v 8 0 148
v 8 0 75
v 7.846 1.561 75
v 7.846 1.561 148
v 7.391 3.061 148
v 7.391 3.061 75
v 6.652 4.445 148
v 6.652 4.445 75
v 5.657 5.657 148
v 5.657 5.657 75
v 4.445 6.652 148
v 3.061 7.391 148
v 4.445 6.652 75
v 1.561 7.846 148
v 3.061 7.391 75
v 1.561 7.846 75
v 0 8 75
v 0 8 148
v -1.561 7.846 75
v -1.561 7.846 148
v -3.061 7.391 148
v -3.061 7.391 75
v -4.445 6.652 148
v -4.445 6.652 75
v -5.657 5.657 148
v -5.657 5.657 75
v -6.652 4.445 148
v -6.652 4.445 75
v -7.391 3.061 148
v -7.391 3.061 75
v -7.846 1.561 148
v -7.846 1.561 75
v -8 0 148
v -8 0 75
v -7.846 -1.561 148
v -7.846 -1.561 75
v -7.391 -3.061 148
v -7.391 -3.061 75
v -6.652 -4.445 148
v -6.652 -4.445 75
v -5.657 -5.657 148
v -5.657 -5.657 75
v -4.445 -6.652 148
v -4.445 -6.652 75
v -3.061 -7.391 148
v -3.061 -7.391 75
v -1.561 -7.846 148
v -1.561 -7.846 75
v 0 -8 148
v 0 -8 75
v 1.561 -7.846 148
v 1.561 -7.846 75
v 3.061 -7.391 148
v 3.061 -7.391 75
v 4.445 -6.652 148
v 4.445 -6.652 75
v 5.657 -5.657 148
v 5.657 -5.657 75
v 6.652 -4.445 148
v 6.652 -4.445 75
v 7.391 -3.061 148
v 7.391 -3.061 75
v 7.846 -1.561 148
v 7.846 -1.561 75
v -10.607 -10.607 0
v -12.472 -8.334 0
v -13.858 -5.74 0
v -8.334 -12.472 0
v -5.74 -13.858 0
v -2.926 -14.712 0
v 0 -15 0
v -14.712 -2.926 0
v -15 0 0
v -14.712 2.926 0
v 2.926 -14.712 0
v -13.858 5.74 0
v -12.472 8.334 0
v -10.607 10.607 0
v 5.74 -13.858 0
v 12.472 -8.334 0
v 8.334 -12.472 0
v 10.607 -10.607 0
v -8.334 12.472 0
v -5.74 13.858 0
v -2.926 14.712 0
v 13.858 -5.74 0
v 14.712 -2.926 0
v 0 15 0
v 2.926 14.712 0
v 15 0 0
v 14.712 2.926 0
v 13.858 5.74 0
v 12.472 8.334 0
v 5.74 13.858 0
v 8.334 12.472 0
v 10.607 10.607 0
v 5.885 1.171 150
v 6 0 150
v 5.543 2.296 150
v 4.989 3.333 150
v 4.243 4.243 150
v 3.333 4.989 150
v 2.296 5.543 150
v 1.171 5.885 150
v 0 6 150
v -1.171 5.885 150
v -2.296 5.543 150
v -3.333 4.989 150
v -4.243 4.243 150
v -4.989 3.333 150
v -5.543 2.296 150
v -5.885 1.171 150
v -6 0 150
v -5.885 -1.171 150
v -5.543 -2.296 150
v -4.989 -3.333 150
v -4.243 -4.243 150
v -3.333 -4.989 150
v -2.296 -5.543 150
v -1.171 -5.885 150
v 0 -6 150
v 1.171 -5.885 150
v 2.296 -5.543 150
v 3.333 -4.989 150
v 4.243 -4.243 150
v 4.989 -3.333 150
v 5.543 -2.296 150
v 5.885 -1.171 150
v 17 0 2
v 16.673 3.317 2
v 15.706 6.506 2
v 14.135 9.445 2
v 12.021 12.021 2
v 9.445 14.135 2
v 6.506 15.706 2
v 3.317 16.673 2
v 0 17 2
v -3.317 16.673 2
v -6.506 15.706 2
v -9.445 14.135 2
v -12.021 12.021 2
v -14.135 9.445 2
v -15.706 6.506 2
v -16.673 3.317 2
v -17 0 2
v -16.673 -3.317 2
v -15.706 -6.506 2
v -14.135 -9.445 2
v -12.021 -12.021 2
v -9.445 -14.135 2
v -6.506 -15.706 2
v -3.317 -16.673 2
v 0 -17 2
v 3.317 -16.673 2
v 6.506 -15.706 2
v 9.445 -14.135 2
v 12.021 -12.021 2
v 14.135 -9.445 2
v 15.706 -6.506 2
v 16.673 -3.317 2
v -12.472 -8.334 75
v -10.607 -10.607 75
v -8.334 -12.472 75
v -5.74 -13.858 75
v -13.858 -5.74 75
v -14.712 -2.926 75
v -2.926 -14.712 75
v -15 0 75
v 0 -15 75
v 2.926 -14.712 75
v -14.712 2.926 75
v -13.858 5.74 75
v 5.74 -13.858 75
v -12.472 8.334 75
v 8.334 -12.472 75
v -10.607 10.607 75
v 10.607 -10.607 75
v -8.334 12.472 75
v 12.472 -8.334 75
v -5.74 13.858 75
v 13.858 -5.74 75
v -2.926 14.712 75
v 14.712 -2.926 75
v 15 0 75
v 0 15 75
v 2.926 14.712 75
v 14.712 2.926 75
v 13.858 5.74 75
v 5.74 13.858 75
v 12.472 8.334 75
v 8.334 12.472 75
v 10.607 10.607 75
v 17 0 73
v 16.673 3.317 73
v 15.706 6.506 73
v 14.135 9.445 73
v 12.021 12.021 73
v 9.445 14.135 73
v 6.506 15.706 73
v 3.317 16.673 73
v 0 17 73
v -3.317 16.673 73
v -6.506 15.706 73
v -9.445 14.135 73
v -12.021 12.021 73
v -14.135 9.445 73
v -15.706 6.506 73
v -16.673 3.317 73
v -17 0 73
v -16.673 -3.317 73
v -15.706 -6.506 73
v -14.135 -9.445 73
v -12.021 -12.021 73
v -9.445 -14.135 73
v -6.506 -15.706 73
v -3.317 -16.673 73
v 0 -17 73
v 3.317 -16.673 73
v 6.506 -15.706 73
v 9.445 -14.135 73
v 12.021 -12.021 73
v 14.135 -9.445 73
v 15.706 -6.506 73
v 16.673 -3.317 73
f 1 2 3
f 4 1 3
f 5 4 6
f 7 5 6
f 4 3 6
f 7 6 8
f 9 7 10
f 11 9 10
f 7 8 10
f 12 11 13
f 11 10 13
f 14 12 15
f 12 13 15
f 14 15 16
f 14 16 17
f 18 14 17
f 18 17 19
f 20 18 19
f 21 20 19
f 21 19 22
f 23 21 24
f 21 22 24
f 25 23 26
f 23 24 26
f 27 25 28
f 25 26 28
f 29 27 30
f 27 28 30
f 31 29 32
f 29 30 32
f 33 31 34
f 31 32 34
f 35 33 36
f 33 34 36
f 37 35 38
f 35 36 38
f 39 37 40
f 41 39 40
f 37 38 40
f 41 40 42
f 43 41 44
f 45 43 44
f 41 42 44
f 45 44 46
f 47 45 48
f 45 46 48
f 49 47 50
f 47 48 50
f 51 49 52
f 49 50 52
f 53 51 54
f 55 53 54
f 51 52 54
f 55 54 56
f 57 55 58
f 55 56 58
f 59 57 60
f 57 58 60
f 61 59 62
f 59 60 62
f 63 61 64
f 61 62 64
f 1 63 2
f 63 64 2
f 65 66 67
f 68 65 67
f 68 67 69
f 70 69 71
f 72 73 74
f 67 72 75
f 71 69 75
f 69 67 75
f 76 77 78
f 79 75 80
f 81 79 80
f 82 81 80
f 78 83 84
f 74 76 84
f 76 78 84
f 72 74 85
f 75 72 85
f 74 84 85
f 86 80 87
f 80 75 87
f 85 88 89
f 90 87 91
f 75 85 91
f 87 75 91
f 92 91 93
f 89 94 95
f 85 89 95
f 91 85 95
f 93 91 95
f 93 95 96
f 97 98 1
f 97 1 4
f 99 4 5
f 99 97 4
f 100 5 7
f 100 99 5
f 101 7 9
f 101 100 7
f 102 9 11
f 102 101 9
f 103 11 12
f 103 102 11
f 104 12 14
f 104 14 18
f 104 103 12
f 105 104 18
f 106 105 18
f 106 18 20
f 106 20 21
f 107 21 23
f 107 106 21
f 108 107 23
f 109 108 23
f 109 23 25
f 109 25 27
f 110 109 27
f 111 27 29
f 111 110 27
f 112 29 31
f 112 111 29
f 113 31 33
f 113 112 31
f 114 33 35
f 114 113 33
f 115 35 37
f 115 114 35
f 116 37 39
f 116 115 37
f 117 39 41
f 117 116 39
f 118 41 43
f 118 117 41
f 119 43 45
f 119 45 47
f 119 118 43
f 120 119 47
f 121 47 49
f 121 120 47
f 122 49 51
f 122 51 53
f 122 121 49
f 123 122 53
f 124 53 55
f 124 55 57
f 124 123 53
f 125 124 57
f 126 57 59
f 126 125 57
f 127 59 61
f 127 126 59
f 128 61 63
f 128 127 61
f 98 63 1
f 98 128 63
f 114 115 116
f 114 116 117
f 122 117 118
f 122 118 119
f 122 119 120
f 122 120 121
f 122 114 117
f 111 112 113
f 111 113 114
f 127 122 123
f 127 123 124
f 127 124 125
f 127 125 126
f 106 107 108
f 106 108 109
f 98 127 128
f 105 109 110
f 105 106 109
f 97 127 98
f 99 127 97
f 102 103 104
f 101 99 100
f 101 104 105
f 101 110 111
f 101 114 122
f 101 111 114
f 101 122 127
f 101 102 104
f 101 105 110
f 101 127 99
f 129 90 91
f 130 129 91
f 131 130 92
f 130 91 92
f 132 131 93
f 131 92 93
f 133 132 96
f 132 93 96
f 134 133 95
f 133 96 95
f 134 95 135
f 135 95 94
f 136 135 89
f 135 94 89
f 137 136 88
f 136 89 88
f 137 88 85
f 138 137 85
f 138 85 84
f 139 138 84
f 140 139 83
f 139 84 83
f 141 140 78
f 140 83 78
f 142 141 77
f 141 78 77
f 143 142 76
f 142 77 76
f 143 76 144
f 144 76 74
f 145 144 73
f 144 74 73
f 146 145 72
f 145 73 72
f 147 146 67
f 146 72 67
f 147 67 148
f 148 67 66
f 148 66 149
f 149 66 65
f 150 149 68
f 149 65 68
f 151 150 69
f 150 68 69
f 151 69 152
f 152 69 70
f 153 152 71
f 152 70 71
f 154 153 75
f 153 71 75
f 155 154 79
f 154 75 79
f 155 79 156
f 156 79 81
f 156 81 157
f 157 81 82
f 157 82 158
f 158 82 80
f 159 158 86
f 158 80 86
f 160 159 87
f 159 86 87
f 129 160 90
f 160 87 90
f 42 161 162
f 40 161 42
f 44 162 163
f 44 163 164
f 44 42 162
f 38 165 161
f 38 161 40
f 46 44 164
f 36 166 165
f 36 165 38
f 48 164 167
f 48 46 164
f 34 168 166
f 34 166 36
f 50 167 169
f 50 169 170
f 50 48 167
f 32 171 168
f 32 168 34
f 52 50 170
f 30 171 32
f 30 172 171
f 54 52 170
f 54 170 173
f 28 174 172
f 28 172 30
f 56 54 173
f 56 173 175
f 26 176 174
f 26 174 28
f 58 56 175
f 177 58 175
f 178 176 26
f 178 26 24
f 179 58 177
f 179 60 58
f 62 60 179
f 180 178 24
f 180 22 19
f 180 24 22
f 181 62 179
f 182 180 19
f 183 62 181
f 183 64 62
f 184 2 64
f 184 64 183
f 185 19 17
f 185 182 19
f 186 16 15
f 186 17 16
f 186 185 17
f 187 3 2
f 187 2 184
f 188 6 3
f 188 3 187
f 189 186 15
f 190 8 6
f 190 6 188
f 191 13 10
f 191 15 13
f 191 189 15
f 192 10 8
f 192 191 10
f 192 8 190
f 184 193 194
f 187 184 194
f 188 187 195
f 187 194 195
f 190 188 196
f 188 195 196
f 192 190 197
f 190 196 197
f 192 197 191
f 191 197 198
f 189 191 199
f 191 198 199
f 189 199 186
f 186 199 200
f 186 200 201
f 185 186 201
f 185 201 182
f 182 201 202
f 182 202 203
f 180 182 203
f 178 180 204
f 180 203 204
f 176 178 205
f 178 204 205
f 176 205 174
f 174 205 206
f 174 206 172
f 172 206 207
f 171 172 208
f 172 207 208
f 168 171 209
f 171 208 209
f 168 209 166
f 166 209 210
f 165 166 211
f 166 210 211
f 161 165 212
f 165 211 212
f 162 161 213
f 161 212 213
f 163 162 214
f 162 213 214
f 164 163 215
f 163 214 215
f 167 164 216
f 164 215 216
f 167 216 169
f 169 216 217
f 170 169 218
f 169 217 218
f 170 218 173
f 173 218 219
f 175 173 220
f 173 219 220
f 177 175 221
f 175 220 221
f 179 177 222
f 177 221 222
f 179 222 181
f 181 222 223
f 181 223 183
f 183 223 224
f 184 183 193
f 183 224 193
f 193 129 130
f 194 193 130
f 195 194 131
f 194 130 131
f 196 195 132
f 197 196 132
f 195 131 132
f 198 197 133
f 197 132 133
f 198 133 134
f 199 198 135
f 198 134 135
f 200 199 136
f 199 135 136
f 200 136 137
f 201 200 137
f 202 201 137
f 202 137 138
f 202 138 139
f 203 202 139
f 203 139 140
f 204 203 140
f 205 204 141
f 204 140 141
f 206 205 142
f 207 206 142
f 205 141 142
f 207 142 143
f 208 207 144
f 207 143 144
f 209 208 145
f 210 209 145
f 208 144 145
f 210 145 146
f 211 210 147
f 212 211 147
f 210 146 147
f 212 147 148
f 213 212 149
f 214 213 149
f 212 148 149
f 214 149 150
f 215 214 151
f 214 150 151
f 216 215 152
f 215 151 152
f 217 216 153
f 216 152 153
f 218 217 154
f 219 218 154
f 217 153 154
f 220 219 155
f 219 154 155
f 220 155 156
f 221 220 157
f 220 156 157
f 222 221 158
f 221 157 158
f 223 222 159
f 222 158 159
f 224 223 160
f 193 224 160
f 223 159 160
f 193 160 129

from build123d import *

# Parameters (mm, degrees)
SKETCH_1_R      = 17
EXTRUDE_1_DEPTH = 75
SKETCH_2_R      = 8
EXTRUDE_2_DEPTH = 75
CHAMFER_1_SIZE  = 2
CHAMFER_2_SIZE  = 2
CHAMFER_3_SIZE  = 2


with BuildPart() as part:
    # Эскиз1 → Бобышка-Вытянуть1 (new body)
    with BuildSketch(Plane.XY):
        Circle(SKETCH_1_R)
    extrude(amount=EXTRUDE_1_DEPTH)

    # Эскиз2 → Бобышка-Вытянуть2 (add)
    with BuildSketch(Plane.XY.offset(75)):
        Circle(SKETCH_2_R)
    extrude(amount=EXTRUDE_2_DEPTH)

    # Фаска1
    chamfer_1_edges = [part.edges().sort_by_distance(p)[0] for p in [
        (-8, 0, 150),
    ]]
    chamfer(chamfer_1_edges, length=CHAMFER_1_SIZE)

    # Фаска2
    chamfer_2_edges = [part.edges().sort_by_distance(p)[0] for p in [
        (-17, 0, 75),
    ]]
    chamfer(chamfer_2_edges, length=CHAMFER_2_SIZE)

    # Фаска3
    chamfer_3_edges = [part.edges().sort_by_distance(p)[0] for p in [
        (-17, 0, 0),
    ]]
    chamfer(chamfer_3_edges, length=CHAMFER_3_SIZE)


solid = part.part
